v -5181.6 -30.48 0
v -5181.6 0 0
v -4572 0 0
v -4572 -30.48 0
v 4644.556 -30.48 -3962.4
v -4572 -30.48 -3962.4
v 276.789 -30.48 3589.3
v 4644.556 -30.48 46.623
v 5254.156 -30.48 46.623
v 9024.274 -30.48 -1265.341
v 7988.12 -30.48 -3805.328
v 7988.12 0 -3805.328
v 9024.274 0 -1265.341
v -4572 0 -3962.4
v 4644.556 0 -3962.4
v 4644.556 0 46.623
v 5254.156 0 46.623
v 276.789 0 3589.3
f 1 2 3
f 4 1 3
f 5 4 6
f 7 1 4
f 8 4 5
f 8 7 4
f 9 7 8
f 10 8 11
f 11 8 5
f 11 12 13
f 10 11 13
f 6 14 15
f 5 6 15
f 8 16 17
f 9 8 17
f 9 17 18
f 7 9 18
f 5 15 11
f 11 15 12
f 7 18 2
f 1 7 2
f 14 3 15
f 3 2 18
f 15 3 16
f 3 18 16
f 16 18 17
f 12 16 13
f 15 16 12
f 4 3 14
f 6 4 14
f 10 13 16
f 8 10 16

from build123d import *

# Parameters (mm, degrees)
F0_W     = 1150.0381231308
F0_H     = 683.8063001633
F0_W_2   = 1392.1880722046
F0_H_2   = 1216.9328927994
F0_W_3   = 1087.8736972809
F0_H_3   = 1596.6608407974
F0_W_4   = 712.281703949
F0_H_4   = 506.6640377045
F1_DEPTH = 30.48


with BuildPart() as f1:
    # F0 (on Front) → F1 (new body)
    with BuildSketch(Plane.XZ):
        Polygon((0, 2750.7667541504), (-4572, 0), (-4572, -3352.8), (-777.7588963509, -3352.8), (-777.7588963509, -1261.7027759552), (1261.9581222534, -1261.7027759552), (1261.9581222534, -3352.8), (4644.5555686951, -3352.8), (4644.5555686951, -556.6199421883), (4644.5555686951, 46.6231629252), align=None)
        Polygon((-4151.6819000244, -1725.0570058823), (-4151.6819000244, -810.6570058823), (-2193.5088634491, -854.7579646111), (-2193.5088634491, -1725.0570058823), align=None, mode=Mode.SUBTRACT)
        with Locations((2173.5275387764, -1352.0717024803)):
            Rectangle(F0_W, F0_H, mode=Mode.SUBTRACT)
        Polygon((8804.9857739324, -1802.8956907823), (4644.5555686951, -556.6199421883), (4644.5555686951, -3352.8), (8172.7228248237, -3352.8), align=None)
        with Locations((6555.5100440979, -2285.2873206139)):
            Rectangle(F0_W_2, F0_H_2, mode=Mode.SUBTRACT)
        Polygon((-5181.6, 0), (-4572, 0), (0, 2750.7667541504), (4644.5555686951, 46.6231629252), (5254.1555686951, 46.6231629252), (276.7887413502, 3589.2996788025), align=None)
        Polygon((-777.7588963509, -3352.8), (-4572, -3352.8), (-4572, -3962.4), (4644.5555686951, -3962.4), (4644.5555686951, -3352.8), (1261.9581222534, -3352.8), (821.4556574821, -3352.8), (-266.4180397987, -3352.8), align=None)
        Polygon((9024.2739507194, -1265.3413541859), (4644.5555686951, 46.6231629252), (4644.5555686951, -556.6199421883), (8804.9857739324, -1802.8956907823), align=None)
        Polygon((-777.7588963509, -1261.7027759552), (-777.7588963509, -3352.8), (-266.4180397987, -3352.8), (-266.4180397987, -1756.1391592026), (821.4556574821, -1756.1391592026), (821.4556574821, -3352.8), (1261.9581222534, -3352.8), (1261.9581222534, -1261.7027759552), align=None)
        Polygon((4644.5555686951, -3352.8), (4644.5555686951, -3962.4), (7988.1200783626, -3805.3278487957), (8172.7228248237, -3352.8), align=None)
        Polygon((-2193.5088634491, -854.7579646111), (-4151.6819000244, -810.6570058823), (-4151.6819000244, -1725.0570058823), (-2193.5088634491, -1725.0570058823), align=None)
        with Locations((277.5188088417, -2554.4695796013)):
            Rectangle(F0_W_3, F0_H_3)
        with Locations((6555.5100440979, -2285.2873206139)):
            Rectangle(F0_W_2, F0_H_2)
        with Locations((6571.6979503632, -2345.3673124313)):
            Rectangle(F0_W_4, F0_H_4, mode=Mode.SUBTRACT)
        with Locations((2173.5275387764, -1352.0717024803)):
            Rectangle(F0_W, F0_H)
        with Locations((6571.6979503632, -2345.3673124313)):
            Rectangle(F0_W_4, F0_H_4)
    extrude(amount=F1_DEPTH)


solid = f1.part
